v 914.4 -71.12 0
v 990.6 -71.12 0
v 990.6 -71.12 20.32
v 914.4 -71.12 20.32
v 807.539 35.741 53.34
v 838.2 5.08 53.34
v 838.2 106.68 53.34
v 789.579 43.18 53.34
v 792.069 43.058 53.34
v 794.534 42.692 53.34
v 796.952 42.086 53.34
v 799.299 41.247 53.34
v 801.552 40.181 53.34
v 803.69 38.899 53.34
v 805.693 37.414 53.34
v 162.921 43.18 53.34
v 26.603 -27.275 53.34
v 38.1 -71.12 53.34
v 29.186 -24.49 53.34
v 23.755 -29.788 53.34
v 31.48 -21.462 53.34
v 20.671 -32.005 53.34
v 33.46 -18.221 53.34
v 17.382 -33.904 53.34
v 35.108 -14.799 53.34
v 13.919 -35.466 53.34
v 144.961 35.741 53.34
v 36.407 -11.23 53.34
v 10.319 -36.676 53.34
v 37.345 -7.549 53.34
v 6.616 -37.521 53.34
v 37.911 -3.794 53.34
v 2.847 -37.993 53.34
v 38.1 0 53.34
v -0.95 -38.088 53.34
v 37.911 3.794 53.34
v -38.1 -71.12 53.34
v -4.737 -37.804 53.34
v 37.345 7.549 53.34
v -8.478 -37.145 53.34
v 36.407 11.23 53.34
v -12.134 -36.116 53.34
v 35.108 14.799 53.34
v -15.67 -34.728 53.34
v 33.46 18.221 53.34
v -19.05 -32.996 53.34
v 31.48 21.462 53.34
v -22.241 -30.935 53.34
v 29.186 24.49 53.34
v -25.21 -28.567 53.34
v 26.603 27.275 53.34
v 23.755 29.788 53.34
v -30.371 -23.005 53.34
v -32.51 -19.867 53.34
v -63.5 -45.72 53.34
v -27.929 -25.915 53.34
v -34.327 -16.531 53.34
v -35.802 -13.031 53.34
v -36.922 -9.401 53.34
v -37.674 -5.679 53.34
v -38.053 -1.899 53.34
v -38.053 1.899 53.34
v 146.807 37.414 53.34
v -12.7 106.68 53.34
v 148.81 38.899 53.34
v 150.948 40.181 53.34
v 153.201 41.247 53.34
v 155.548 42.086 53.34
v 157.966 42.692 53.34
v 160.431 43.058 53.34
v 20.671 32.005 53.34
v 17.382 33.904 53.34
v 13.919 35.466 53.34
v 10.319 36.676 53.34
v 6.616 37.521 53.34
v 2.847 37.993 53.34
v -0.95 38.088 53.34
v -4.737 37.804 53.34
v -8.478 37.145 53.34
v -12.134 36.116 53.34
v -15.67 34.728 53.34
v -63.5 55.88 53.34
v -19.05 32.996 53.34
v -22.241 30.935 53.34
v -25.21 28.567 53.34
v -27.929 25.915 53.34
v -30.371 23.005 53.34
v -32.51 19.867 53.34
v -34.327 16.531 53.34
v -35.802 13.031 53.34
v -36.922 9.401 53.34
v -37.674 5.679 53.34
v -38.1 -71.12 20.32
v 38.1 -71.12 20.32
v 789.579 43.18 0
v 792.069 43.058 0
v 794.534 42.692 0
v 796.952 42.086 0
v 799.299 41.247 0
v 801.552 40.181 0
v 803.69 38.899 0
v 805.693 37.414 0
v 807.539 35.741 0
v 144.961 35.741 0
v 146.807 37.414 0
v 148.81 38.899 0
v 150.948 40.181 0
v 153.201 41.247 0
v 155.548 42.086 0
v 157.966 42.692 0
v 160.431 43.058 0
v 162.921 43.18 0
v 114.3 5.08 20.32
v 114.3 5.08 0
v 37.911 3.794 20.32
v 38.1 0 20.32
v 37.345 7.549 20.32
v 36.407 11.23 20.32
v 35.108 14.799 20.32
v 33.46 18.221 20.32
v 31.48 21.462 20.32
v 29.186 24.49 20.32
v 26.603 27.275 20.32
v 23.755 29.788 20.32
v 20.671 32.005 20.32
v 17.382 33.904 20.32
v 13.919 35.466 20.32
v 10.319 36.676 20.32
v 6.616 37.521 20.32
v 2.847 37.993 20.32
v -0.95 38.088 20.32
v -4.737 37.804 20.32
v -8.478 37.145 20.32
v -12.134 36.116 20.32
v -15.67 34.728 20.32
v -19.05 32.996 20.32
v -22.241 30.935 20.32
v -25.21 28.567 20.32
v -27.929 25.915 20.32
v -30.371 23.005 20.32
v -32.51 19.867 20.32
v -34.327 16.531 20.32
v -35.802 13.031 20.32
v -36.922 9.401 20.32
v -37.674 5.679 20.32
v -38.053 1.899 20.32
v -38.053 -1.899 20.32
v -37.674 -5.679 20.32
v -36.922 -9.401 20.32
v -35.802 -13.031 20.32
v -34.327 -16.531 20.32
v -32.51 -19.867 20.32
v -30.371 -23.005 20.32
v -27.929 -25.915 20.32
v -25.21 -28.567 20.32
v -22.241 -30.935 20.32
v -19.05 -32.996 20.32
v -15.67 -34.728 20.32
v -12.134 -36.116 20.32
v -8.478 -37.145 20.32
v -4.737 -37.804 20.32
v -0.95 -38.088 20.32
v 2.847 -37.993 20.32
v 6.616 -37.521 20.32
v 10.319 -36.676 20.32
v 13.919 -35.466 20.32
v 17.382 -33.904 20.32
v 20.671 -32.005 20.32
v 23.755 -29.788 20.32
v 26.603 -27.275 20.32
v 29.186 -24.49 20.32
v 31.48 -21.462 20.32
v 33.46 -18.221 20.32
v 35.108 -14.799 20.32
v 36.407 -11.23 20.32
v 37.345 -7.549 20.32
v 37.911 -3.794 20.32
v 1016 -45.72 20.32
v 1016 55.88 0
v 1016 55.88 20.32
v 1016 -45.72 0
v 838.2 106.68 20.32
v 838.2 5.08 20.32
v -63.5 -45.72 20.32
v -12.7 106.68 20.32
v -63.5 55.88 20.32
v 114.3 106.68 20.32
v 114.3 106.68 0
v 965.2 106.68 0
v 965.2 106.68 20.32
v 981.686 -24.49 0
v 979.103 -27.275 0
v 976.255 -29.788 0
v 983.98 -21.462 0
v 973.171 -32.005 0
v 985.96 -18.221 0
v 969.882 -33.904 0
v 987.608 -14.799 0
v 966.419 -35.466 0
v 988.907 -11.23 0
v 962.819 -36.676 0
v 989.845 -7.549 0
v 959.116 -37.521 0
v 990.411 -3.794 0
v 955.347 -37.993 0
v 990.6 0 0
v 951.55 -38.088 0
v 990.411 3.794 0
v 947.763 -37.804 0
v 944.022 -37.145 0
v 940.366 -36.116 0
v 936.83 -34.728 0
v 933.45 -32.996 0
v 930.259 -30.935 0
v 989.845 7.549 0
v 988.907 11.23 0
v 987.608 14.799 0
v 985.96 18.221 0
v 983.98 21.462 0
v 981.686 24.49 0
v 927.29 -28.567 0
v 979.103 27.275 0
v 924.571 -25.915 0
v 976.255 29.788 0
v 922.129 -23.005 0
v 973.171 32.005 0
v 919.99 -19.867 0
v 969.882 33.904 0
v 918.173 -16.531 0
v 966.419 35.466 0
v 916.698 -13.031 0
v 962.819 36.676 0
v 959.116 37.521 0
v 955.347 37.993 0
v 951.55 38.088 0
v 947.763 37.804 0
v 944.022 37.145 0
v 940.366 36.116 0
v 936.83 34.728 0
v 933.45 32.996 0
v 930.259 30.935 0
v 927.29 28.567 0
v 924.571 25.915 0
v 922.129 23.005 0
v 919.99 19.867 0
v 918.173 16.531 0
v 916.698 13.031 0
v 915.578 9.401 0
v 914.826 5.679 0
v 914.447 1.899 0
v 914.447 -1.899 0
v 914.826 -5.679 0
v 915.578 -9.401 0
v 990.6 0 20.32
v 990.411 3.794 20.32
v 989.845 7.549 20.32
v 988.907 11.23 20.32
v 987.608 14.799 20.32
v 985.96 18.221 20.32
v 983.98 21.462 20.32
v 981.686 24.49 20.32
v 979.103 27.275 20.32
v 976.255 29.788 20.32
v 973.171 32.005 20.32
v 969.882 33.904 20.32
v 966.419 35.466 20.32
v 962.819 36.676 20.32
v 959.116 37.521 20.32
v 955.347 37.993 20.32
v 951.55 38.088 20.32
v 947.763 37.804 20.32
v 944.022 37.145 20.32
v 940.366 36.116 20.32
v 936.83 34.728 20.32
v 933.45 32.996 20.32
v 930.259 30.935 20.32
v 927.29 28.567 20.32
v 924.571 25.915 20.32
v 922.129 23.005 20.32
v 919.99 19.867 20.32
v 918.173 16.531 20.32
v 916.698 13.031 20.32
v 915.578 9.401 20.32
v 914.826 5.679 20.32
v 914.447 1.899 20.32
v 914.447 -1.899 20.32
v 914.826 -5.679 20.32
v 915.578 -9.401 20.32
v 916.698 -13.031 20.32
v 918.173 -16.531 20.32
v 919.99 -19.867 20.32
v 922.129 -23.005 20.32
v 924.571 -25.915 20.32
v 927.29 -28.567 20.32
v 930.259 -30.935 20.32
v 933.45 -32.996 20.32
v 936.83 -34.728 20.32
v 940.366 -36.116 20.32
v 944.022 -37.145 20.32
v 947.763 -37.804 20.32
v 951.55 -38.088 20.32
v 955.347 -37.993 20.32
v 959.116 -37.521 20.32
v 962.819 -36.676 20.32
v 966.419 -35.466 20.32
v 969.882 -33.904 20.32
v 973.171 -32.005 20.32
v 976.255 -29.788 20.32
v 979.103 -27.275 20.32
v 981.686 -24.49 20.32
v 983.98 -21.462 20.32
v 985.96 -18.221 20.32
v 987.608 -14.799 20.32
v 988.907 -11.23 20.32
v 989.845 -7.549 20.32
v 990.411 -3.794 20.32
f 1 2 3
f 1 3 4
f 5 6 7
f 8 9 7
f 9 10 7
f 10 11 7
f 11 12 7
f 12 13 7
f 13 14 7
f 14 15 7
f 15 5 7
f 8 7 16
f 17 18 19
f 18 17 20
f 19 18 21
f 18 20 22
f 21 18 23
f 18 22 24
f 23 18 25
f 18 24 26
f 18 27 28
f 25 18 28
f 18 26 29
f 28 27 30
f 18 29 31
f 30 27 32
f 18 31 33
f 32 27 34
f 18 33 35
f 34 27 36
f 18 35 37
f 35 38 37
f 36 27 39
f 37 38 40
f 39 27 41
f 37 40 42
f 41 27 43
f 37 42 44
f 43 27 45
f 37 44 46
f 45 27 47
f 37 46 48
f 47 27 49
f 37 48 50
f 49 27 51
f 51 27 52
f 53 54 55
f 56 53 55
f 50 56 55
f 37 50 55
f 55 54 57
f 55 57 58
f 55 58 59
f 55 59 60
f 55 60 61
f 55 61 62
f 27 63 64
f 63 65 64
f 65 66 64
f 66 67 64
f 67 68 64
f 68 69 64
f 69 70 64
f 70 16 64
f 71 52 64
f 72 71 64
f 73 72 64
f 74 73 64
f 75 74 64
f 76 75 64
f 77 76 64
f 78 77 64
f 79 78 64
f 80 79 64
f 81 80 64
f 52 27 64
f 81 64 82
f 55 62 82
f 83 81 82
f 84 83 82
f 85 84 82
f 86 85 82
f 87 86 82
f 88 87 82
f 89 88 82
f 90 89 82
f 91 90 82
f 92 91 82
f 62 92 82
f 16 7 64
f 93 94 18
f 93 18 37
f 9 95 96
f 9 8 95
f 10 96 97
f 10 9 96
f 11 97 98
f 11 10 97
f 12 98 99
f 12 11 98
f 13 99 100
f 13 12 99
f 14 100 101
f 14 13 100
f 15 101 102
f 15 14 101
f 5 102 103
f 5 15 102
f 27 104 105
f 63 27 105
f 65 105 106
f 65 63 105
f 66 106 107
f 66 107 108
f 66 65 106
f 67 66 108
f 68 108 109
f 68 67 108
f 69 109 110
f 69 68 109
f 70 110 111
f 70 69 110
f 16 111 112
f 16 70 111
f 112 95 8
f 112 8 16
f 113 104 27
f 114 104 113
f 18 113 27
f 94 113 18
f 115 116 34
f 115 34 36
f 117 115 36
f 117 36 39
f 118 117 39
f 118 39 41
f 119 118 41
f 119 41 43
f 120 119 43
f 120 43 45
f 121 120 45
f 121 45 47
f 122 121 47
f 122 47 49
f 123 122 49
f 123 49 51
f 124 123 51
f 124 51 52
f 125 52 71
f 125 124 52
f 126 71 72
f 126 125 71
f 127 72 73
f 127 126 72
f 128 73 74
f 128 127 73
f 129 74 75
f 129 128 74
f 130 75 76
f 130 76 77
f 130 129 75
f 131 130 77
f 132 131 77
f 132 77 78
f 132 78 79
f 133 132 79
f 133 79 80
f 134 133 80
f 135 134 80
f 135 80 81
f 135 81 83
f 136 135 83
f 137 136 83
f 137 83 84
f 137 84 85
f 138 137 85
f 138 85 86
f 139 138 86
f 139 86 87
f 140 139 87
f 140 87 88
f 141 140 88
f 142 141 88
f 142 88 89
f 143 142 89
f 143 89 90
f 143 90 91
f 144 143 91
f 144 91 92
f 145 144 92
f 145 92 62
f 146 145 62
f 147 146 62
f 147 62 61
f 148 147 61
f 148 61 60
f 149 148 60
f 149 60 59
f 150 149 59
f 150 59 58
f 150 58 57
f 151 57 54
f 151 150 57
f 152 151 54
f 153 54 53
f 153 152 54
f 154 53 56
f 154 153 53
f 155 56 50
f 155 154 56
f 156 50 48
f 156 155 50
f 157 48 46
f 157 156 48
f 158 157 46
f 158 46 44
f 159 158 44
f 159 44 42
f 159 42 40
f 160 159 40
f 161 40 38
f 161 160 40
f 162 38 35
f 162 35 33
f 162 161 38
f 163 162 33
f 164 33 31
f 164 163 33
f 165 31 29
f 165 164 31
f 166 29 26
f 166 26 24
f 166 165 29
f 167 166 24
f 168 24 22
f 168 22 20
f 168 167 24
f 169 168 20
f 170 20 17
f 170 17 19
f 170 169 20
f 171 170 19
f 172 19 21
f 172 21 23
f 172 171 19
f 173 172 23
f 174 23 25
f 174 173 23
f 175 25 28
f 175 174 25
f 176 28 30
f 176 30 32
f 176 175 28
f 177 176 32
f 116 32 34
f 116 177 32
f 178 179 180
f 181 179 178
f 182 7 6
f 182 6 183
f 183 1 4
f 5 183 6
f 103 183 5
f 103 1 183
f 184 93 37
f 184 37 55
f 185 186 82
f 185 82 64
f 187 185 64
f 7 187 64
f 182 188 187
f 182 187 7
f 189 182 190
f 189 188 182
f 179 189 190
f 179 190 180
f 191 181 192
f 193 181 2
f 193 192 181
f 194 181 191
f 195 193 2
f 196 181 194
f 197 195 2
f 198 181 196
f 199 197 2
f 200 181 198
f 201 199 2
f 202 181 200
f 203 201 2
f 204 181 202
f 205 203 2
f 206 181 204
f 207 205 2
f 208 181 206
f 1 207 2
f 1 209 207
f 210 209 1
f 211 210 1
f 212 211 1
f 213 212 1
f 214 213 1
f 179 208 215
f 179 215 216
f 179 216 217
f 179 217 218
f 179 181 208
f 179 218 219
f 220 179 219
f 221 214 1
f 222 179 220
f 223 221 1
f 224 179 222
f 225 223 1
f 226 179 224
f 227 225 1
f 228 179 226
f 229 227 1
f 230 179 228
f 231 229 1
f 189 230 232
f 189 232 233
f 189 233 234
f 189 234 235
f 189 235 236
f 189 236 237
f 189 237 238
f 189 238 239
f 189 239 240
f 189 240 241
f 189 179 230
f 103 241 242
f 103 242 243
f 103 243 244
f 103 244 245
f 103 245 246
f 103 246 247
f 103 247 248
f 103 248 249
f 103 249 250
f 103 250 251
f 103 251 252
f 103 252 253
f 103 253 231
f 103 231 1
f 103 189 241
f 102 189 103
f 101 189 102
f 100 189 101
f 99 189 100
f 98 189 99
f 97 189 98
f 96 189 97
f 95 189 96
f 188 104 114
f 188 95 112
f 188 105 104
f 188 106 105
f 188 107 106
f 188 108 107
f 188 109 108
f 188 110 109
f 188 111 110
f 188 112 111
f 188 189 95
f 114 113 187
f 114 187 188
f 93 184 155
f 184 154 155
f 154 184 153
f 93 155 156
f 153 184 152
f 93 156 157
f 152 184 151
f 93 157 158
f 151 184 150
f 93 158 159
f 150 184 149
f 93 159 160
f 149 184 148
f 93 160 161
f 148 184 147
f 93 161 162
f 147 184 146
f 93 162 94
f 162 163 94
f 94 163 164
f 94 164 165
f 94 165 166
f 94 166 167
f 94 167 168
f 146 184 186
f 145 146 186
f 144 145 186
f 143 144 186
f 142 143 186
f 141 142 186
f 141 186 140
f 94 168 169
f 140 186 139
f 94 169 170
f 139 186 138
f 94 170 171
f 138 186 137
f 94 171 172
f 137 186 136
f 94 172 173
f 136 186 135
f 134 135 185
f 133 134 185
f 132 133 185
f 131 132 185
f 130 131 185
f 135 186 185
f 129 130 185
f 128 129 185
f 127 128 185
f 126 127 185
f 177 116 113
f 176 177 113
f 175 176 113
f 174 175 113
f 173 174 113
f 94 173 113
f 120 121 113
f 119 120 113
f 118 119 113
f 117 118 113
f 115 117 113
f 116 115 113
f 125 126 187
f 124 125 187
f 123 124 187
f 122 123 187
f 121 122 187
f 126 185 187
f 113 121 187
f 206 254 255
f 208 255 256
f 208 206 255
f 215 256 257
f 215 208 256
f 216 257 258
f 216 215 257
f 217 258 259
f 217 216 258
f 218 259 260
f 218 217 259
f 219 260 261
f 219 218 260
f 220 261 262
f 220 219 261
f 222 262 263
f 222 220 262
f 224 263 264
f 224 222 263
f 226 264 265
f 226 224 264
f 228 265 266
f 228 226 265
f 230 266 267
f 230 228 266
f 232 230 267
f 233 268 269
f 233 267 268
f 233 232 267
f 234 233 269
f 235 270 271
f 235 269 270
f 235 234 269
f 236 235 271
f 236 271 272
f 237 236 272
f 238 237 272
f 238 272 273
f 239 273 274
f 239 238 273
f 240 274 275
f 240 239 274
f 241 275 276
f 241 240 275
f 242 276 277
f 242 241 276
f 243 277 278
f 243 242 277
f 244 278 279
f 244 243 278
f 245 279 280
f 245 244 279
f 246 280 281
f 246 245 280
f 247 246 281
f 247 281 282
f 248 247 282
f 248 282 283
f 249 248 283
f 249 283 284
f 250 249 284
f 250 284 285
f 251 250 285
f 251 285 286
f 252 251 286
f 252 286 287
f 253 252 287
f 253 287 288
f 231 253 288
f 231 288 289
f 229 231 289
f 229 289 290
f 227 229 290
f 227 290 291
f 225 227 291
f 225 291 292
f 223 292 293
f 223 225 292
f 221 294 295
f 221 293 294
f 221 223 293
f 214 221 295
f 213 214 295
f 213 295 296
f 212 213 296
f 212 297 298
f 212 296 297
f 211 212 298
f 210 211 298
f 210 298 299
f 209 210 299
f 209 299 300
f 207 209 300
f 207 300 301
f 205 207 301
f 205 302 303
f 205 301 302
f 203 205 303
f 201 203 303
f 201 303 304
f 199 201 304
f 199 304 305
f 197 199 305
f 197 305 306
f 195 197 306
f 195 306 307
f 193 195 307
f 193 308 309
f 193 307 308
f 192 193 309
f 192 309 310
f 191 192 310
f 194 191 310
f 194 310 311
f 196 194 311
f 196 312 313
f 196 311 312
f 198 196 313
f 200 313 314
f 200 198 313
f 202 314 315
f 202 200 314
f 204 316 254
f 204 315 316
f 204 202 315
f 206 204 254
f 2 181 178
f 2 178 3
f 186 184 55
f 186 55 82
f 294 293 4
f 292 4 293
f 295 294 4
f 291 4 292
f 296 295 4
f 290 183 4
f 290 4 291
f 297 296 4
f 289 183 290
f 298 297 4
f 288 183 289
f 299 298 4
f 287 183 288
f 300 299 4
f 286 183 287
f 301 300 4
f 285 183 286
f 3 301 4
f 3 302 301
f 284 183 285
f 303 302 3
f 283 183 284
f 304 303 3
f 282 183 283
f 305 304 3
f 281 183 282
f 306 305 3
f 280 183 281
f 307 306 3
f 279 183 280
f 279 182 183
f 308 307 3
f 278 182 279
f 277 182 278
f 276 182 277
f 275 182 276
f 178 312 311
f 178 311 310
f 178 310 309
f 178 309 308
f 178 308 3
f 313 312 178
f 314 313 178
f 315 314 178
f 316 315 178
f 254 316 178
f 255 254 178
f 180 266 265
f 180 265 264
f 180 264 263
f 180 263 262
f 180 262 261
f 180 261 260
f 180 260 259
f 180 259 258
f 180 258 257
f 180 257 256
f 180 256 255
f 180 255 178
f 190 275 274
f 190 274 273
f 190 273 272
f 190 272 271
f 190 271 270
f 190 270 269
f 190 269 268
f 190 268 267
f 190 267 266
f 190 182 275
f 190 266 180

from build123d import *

# Parameters (mm, degrees)
SKETCH4_R       = 38.1
BASE_DEPTH      = 53.34
SKETCH5_W       = 177.8
SKETCH5_H       = 20.32
SKETCH5_H_2     = 33.02
SIDE_CUTS_DEPTH = 178.8
BOTTOM_FILLET_R = 25.4


with BuildPart() as part:
    # Sketch4 → Base (new body)
    with BuildSketch(Plane.XY):
        Polygon((38.1, -71.12), (-38.1, -71.12), (-63.5, -45.72), (-63.5, 55.88), (-12.7, 106.68), (965.2, 106.68), (1016, 55.88), (1016, -45.72), (990.6, -71.12), (914.4, -71.12), (800.1, 43.18), (152.4, 43.18), align=None)
        Circle(SKETCH4_R, mode=Mode.SUBTRACT)
        with Locations((952.5, 0)):
            Circle(SKETCH4_R, mode=Mode.SUBTRACT)
    extrude(amount=BASE_DEPTH)

    # Sketch5 → side cuts (cut, through all)
    with BuildSketch(Plane(origin=(0, 106.68, 0), x_dir=(1, 0, 0), z_dir=(0, 1, 0))):
        with Locations((25.4, -10.16)):
            Rectangle(SKETCH5_W, SKETCH5_H)
        with Locations((927.1, -36.83)):
            Rectangle(SKETCH5_W, SKETCH5_H_2)
    extrude(amount=-SIDE_CUTS_DEPTH, mode=Mode.SUBTRACT)

    # bottom fillet
    bottom_fillet_edges = [part.edges().sort_by_distance(p)[0] for p in [
        (800.1, 43.18, 26.67),
        (152.4, 43.18, 26.67),
    ]]
    fillet(bottom_fillet_edges, radius=BOTTOM_FILLET_R)


solid = part.part
